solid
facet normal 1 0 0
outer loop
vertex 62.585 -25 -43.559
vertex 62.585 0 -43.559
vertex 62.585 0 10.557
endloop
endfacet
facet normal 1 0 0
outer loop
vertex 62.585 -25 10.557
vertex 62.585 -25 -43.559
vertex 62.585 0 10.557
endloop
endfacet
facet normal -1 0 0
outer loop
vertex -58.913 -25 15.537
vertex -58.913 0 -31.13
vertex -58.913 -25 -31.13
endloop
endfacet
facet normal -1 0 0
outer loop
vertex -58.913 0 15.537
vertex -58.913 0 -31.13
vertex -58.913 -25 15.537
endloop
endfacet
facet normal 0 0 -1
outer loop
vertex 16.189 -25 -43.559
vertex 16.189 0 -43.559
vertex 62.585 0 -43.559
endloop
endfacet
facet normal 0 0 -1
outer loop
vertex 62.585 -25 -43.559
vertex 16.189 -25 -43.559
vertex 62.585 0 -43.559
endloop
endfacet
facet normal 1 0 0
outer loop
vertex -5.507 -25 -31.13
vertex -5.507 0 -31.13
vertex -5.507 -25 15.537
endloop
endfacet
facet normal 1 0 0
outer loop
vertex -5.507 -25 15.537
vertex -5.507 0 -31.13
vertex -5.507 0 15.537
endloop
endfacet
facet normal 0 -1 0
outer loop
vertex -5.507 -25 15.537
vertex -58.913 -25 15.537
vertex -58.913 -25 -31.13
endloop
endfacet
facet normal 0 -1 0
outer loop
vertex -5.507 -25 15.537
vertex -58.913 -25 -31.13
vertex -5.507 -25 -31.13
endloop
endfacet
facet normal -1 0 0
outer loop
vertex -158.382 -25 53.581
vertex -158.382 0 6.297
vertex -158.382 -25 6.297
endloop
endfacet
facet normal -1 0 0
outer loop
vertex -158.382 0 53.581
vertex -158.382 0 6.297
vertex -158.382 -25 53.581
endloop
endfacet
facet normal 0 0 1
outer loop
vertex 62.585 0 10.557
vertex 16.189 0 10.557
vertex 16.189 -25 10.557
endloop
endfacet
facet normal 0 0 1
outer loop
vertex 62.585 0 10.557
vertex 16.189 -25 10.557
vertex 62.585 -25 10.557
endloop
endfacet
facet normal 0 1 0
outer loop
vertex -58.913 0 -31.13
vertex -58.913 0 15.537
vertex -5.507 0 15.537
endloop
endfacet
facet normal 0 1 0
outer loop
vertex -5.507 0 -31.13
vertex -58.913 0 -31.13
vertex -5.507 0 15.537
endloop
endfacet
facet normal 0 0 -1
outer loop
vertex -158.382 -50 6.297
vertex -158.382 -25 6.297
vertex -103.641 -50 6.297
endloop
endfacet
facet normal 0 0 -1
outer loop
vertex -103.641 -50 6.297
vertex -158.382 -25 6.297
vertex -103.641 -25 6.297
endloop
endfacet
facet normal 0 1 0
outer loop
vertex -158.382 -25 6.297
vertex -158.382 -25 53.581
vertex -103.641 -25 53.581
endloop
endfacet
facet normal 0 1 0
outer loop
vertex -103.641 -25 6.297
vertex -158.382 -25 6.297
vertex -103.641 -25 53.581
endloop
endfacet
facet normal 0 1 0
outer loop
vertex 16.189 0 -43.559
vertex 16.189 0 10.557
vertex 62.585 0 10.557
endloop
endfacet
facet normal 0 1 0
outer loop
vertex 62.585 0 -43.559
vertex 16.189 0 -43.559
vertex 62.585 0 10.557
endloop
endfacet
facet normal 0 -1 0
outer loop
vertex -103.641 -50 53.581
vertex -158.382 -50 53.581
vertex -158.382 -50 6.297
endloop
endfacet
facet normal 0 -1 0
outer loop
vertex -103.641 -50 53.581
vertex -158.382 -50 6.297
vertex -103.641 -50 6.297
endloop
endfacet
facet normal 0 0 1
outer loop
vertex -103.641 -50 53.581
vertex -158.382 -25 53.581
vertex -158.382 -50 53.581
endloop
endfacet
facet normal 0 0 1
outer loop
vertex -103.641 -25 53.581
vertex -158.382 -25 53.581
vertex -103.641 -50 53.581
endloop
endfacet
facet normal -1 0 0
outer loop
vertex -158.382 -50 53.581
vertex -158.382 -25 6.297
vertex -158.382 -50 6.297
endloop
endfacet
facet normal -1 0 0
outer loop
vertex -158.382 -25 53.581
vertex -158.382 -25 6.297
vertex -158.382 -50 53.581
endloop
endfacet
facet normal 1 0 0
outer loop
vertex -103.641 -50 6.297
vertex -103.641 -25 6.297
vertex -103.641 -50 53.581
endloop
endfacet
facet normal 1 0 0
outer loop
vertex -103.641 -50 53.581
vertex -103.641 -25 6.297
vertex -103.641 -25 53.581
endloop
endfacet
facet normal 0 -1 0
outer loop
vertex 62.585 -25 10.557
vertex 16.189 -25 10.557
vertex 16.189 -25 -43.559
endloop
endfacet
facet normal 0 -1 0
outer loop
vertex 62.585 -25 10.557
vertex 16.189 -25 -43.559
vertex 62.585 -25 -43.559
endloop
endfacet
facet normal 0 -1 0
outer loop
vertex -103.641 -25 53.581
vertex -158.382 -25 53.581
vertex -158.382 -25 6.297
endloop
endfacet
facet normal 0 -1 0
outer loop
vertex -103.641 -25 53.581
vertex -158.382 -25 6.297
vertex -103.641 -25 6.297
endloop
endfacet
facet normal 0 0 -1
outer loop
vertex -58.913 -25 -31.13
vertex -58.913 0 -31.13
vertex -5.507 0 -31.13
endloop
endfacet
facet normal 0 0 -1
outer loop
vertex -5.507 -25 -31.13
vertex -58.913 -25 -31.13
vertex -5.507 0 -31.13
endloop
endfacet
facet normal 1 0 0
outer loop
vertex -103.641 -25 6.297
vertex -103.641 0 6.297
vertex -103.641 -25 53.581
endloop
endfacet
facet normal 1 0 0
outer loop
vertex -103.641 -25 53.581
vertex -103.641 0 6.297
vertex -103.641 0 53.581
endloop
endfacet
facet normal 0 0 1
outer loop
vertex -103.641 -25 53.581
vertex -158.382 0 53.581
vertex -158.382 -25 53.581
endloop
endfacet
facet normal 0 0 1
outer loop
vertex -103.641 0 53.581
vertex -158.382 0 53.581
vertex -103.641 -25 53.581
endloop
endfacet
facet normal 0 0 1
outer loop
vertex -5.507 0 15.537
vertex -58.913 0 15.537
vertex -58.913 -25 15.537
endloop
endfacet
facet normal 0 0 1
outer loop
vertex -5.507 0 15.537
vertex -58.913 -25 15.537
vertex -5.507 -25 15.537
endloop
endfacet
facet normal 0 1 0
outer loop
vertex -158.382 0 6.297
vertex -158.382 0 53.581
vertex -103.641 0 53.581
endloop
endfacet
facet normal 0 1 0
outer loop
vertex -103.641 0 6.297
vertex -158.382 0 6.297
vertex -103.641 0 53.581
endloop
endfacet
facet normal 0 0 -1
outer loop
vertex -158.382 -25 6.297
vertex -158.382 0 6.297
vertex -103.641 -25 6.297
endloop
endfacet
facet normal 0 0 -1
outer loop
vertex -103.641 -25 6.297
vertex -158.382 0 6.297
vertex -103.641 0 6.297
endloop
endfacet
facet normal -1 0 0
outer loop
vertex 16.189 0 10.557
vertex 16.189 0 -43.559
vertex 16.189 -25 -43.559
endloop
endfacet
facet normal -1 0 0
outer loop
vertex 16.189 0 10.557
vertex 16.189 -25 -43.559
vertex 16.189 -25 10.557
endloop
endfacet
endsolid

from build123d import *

# Parameters (mm, degrees)
F0_W      = 54.741092
F0_H      = 47.283376
F0_W_2    = 53.405944
F0_H_2    = 46.667445
F0_W_3    = 46.396409
F0_H_3    = 54.115518
F1_DEPTH  = 25
F1_FACE_W = 54.741092
F1_FACE_H = 47.283376
F2_DEPTH  = 25


with BuildPart() as f1:
    # F0 (on Front) → F1 (new body)
    with BuildSketch(Plane.XZ):
        with Locations((-131.011453, 29.939039)):
            Rectangle(F0_W, F0_H)
        with Locations((-32.21046, -7.796317)):
            Rectangle(F0_W_2, F0_H_2)
        with Locations((39.386882, -16.501215)):
            Rectangle(F0_W_3, F0_H_3)
    extrude(amount=F1_DEPTH)


with BuildPart() as f2:
    # F1_face (on face) → F2 (new body)
    with BuildSketch(Plane(origin=(-131.011453, -25, 29.939039), x_dir=(1, 0, 0), z_dir=(0, -1, 0))):
        Rectangle(F1_FACE_W, F1_FACE_H)
    extrude(amount=F2_DEPTH)


solid = Compound([f1.part, f2.part])
